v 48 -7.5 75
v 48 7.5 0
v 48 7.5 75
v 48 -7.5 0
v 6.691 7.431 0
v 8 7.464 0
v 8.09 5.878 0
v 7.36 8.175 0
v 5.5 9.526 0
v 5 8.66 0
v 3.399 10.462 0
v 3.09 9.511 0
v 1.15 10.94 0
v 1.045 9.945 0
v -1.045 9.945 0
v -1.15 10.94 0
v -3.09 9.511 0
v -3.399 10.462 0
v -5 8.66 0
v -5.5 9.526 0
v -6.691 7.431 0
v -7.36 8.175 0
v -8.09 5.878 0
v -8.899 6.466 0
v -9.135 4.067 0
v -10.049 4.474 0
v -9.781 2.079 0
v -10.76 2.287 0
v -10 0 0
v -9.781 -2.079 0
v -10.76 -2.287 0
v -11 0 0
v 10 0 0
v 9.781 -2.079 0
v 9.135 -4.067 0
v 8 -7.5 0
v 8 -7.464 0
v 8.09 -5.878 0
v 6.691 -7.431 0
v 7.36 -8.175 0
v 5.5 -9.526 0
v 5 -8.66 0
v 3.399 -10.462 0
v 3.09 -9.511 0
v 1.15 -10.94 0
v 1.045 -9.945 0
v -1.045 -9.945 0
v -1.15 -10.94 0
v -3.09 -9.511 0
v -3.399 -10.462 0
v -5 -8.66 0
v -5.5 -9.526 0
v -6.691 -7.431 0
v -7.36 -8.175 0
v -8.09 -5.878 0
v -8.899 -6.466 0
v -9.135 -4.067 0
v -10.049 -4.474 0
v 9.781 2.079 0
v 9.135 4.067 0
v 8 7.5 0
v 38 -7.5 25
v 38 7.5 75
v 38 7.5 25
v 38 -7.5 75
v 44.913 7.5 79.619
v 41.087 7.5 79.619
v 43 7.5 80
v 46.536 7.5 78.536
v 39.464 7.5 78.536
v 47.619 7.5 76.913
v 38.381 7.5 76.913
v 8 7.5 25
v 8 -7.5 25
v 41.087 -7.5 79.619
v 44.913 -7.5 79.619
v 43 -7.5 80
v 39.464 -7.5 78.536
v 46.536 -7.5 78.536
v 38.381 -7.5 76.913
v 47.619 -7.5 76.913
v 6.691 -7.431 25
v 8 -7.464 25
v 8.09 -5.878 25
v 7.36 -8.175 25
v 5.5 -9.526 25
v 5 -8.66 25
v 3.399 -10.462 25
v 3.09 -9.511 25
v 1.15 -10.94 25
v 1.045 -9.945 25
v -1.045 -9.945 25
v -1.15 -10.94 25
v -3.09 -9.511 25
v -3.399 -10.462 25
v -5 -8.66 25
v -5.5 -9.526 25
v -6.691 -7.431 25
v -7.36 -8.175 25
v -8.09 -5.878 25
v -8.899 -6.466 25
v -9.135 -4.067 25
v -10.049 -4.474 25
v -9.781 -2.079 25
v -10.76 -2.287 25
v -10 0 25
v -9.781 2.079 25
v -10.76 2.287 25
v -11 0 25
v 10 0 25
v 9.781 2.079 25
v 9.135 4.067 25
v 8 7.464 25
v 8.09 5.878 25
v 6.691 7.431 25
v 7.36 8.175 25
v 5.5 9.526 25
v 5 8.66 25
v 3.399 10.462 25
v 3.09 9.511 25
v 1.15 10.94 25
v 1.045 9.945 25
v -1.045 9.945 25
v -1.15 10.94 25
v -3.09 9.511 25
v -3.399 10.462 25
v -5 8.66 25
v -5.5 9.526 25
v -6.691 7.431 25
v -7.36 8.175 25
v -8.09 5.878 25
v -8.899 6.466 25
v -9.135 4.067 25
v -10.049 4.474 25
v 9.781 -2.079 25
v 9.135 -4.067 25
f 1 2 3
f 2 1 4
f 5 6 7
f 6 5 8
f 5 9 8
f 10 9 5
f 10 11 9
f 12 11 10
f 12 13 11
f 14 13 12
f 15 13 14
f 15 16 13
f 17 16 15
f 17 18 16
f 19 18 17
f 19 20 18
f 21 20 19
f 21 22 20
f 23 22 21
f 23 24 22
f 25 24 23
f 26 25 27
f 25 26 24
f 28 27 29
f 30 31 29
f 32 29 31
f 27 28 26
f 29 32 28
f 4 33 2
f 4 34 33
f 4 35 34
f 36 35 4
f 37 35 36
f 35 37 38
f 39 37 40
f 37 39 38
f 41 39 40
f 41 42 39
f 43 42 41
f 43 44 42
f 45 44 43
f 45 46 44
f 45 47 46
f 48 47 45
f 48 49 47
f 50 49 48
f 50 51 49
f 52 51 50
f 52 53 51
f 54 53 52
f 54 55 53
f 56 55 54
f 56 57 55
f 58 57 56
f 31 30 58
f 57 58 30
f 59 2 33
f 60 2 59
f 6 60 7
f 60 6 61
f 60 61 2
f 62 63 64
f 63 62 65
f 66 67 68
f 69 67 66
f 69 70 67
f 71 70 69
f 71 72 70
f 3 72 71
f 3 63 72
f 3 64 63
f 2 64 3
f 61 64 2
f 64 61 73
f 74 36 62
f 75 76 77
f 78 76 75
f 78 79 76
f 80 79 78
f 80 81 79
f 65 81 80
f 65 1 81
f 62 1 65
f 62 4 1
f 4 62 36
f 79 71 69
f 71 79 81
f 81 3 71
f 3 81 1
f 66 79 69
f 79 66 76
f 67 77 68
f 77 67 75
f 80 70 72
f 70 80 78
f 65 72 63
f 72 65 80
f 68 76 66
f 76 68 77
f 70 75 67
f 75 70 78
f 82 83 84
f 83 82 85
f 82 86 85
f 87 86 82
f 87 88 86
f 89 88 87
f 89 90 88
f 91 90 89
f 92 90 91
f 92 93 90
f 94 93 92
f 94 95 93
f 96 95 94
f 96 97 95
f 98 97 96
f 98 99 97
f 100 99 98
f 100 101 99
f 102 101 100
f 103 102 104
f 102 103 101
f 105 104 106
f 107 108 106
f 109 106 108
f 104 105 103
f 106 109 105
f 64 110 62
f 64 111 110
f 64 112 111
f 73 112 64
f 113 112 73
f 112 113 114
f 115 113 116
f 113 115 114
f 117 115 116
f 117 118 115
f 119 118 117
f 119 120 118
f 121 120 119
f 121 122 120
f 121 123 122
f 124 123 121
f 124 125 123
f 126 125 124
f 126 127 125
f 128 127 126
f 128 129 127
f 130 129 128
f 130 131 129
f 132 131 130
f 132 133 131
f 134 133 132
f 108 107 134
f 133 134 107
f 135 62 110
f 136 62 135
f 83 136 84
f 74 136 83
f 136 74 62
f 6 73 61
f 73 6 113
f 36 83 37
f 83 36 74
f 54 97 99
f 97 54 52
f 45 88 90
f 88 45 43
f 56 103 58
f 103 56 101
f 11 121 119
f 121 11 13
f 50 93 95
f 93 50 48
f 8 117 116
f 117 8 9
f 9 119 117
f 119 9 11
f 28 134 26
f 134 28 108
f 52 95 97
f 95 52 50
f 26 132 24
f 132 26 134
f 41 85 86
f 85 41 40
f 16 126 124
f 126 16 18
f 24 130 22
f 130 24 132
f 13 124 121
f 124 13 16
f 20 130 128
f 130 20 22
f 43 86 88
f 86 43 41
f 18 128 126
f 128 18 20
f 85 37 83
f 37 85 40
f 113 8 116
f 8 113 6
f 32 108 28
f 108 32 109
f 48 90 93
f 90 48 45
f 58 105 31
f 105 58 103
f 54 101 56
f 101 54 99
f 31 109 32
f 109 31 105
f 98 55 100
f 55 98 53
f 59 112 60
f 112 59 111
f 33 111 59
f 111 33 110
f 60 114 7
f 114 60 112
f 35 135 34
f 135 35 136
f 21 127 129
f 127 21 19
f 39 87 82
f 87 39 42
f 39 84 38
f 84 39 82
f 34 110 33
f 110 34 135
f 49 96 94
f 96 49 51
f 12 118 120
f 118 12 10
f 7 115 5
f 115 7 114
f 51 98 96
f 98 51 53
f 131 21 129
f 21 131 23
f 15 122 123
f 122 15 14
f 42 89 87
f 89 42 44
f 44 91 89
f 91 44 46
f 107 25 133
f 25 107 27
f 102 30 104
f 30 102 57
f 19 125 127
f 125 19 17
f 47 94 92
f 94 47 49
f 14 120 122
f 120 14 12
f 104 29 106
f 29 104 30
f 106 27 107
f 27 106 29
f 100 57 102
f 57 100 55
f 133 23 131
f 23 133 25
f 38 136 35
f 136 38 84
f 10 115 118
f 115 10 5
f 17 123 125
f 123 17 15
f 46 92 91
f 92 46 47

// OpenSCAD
dowelDiameter = 20;

jutte(dowelDiameter);

module jutte(diameter) {
	diameter = (diameter < 20)?20:diameter;
	difference() {
		union() {
			cylinder(25, d=diameter+2);
			translate([diameter/2 -2, -7.5, 0]) {
				cube([30, 15, 25]);
				translate([30, 0, 0]) {
					cube([10,15,75]);
					translate([5, 15, 75]) {
						rotate([90, 0, 0]) {
							cylinder(15, d=10);
						}
					}
				}			
			}
		}
		translate([0, 0, -125]) {
			cylinder(500, d=diameter);
		}
	}
}
